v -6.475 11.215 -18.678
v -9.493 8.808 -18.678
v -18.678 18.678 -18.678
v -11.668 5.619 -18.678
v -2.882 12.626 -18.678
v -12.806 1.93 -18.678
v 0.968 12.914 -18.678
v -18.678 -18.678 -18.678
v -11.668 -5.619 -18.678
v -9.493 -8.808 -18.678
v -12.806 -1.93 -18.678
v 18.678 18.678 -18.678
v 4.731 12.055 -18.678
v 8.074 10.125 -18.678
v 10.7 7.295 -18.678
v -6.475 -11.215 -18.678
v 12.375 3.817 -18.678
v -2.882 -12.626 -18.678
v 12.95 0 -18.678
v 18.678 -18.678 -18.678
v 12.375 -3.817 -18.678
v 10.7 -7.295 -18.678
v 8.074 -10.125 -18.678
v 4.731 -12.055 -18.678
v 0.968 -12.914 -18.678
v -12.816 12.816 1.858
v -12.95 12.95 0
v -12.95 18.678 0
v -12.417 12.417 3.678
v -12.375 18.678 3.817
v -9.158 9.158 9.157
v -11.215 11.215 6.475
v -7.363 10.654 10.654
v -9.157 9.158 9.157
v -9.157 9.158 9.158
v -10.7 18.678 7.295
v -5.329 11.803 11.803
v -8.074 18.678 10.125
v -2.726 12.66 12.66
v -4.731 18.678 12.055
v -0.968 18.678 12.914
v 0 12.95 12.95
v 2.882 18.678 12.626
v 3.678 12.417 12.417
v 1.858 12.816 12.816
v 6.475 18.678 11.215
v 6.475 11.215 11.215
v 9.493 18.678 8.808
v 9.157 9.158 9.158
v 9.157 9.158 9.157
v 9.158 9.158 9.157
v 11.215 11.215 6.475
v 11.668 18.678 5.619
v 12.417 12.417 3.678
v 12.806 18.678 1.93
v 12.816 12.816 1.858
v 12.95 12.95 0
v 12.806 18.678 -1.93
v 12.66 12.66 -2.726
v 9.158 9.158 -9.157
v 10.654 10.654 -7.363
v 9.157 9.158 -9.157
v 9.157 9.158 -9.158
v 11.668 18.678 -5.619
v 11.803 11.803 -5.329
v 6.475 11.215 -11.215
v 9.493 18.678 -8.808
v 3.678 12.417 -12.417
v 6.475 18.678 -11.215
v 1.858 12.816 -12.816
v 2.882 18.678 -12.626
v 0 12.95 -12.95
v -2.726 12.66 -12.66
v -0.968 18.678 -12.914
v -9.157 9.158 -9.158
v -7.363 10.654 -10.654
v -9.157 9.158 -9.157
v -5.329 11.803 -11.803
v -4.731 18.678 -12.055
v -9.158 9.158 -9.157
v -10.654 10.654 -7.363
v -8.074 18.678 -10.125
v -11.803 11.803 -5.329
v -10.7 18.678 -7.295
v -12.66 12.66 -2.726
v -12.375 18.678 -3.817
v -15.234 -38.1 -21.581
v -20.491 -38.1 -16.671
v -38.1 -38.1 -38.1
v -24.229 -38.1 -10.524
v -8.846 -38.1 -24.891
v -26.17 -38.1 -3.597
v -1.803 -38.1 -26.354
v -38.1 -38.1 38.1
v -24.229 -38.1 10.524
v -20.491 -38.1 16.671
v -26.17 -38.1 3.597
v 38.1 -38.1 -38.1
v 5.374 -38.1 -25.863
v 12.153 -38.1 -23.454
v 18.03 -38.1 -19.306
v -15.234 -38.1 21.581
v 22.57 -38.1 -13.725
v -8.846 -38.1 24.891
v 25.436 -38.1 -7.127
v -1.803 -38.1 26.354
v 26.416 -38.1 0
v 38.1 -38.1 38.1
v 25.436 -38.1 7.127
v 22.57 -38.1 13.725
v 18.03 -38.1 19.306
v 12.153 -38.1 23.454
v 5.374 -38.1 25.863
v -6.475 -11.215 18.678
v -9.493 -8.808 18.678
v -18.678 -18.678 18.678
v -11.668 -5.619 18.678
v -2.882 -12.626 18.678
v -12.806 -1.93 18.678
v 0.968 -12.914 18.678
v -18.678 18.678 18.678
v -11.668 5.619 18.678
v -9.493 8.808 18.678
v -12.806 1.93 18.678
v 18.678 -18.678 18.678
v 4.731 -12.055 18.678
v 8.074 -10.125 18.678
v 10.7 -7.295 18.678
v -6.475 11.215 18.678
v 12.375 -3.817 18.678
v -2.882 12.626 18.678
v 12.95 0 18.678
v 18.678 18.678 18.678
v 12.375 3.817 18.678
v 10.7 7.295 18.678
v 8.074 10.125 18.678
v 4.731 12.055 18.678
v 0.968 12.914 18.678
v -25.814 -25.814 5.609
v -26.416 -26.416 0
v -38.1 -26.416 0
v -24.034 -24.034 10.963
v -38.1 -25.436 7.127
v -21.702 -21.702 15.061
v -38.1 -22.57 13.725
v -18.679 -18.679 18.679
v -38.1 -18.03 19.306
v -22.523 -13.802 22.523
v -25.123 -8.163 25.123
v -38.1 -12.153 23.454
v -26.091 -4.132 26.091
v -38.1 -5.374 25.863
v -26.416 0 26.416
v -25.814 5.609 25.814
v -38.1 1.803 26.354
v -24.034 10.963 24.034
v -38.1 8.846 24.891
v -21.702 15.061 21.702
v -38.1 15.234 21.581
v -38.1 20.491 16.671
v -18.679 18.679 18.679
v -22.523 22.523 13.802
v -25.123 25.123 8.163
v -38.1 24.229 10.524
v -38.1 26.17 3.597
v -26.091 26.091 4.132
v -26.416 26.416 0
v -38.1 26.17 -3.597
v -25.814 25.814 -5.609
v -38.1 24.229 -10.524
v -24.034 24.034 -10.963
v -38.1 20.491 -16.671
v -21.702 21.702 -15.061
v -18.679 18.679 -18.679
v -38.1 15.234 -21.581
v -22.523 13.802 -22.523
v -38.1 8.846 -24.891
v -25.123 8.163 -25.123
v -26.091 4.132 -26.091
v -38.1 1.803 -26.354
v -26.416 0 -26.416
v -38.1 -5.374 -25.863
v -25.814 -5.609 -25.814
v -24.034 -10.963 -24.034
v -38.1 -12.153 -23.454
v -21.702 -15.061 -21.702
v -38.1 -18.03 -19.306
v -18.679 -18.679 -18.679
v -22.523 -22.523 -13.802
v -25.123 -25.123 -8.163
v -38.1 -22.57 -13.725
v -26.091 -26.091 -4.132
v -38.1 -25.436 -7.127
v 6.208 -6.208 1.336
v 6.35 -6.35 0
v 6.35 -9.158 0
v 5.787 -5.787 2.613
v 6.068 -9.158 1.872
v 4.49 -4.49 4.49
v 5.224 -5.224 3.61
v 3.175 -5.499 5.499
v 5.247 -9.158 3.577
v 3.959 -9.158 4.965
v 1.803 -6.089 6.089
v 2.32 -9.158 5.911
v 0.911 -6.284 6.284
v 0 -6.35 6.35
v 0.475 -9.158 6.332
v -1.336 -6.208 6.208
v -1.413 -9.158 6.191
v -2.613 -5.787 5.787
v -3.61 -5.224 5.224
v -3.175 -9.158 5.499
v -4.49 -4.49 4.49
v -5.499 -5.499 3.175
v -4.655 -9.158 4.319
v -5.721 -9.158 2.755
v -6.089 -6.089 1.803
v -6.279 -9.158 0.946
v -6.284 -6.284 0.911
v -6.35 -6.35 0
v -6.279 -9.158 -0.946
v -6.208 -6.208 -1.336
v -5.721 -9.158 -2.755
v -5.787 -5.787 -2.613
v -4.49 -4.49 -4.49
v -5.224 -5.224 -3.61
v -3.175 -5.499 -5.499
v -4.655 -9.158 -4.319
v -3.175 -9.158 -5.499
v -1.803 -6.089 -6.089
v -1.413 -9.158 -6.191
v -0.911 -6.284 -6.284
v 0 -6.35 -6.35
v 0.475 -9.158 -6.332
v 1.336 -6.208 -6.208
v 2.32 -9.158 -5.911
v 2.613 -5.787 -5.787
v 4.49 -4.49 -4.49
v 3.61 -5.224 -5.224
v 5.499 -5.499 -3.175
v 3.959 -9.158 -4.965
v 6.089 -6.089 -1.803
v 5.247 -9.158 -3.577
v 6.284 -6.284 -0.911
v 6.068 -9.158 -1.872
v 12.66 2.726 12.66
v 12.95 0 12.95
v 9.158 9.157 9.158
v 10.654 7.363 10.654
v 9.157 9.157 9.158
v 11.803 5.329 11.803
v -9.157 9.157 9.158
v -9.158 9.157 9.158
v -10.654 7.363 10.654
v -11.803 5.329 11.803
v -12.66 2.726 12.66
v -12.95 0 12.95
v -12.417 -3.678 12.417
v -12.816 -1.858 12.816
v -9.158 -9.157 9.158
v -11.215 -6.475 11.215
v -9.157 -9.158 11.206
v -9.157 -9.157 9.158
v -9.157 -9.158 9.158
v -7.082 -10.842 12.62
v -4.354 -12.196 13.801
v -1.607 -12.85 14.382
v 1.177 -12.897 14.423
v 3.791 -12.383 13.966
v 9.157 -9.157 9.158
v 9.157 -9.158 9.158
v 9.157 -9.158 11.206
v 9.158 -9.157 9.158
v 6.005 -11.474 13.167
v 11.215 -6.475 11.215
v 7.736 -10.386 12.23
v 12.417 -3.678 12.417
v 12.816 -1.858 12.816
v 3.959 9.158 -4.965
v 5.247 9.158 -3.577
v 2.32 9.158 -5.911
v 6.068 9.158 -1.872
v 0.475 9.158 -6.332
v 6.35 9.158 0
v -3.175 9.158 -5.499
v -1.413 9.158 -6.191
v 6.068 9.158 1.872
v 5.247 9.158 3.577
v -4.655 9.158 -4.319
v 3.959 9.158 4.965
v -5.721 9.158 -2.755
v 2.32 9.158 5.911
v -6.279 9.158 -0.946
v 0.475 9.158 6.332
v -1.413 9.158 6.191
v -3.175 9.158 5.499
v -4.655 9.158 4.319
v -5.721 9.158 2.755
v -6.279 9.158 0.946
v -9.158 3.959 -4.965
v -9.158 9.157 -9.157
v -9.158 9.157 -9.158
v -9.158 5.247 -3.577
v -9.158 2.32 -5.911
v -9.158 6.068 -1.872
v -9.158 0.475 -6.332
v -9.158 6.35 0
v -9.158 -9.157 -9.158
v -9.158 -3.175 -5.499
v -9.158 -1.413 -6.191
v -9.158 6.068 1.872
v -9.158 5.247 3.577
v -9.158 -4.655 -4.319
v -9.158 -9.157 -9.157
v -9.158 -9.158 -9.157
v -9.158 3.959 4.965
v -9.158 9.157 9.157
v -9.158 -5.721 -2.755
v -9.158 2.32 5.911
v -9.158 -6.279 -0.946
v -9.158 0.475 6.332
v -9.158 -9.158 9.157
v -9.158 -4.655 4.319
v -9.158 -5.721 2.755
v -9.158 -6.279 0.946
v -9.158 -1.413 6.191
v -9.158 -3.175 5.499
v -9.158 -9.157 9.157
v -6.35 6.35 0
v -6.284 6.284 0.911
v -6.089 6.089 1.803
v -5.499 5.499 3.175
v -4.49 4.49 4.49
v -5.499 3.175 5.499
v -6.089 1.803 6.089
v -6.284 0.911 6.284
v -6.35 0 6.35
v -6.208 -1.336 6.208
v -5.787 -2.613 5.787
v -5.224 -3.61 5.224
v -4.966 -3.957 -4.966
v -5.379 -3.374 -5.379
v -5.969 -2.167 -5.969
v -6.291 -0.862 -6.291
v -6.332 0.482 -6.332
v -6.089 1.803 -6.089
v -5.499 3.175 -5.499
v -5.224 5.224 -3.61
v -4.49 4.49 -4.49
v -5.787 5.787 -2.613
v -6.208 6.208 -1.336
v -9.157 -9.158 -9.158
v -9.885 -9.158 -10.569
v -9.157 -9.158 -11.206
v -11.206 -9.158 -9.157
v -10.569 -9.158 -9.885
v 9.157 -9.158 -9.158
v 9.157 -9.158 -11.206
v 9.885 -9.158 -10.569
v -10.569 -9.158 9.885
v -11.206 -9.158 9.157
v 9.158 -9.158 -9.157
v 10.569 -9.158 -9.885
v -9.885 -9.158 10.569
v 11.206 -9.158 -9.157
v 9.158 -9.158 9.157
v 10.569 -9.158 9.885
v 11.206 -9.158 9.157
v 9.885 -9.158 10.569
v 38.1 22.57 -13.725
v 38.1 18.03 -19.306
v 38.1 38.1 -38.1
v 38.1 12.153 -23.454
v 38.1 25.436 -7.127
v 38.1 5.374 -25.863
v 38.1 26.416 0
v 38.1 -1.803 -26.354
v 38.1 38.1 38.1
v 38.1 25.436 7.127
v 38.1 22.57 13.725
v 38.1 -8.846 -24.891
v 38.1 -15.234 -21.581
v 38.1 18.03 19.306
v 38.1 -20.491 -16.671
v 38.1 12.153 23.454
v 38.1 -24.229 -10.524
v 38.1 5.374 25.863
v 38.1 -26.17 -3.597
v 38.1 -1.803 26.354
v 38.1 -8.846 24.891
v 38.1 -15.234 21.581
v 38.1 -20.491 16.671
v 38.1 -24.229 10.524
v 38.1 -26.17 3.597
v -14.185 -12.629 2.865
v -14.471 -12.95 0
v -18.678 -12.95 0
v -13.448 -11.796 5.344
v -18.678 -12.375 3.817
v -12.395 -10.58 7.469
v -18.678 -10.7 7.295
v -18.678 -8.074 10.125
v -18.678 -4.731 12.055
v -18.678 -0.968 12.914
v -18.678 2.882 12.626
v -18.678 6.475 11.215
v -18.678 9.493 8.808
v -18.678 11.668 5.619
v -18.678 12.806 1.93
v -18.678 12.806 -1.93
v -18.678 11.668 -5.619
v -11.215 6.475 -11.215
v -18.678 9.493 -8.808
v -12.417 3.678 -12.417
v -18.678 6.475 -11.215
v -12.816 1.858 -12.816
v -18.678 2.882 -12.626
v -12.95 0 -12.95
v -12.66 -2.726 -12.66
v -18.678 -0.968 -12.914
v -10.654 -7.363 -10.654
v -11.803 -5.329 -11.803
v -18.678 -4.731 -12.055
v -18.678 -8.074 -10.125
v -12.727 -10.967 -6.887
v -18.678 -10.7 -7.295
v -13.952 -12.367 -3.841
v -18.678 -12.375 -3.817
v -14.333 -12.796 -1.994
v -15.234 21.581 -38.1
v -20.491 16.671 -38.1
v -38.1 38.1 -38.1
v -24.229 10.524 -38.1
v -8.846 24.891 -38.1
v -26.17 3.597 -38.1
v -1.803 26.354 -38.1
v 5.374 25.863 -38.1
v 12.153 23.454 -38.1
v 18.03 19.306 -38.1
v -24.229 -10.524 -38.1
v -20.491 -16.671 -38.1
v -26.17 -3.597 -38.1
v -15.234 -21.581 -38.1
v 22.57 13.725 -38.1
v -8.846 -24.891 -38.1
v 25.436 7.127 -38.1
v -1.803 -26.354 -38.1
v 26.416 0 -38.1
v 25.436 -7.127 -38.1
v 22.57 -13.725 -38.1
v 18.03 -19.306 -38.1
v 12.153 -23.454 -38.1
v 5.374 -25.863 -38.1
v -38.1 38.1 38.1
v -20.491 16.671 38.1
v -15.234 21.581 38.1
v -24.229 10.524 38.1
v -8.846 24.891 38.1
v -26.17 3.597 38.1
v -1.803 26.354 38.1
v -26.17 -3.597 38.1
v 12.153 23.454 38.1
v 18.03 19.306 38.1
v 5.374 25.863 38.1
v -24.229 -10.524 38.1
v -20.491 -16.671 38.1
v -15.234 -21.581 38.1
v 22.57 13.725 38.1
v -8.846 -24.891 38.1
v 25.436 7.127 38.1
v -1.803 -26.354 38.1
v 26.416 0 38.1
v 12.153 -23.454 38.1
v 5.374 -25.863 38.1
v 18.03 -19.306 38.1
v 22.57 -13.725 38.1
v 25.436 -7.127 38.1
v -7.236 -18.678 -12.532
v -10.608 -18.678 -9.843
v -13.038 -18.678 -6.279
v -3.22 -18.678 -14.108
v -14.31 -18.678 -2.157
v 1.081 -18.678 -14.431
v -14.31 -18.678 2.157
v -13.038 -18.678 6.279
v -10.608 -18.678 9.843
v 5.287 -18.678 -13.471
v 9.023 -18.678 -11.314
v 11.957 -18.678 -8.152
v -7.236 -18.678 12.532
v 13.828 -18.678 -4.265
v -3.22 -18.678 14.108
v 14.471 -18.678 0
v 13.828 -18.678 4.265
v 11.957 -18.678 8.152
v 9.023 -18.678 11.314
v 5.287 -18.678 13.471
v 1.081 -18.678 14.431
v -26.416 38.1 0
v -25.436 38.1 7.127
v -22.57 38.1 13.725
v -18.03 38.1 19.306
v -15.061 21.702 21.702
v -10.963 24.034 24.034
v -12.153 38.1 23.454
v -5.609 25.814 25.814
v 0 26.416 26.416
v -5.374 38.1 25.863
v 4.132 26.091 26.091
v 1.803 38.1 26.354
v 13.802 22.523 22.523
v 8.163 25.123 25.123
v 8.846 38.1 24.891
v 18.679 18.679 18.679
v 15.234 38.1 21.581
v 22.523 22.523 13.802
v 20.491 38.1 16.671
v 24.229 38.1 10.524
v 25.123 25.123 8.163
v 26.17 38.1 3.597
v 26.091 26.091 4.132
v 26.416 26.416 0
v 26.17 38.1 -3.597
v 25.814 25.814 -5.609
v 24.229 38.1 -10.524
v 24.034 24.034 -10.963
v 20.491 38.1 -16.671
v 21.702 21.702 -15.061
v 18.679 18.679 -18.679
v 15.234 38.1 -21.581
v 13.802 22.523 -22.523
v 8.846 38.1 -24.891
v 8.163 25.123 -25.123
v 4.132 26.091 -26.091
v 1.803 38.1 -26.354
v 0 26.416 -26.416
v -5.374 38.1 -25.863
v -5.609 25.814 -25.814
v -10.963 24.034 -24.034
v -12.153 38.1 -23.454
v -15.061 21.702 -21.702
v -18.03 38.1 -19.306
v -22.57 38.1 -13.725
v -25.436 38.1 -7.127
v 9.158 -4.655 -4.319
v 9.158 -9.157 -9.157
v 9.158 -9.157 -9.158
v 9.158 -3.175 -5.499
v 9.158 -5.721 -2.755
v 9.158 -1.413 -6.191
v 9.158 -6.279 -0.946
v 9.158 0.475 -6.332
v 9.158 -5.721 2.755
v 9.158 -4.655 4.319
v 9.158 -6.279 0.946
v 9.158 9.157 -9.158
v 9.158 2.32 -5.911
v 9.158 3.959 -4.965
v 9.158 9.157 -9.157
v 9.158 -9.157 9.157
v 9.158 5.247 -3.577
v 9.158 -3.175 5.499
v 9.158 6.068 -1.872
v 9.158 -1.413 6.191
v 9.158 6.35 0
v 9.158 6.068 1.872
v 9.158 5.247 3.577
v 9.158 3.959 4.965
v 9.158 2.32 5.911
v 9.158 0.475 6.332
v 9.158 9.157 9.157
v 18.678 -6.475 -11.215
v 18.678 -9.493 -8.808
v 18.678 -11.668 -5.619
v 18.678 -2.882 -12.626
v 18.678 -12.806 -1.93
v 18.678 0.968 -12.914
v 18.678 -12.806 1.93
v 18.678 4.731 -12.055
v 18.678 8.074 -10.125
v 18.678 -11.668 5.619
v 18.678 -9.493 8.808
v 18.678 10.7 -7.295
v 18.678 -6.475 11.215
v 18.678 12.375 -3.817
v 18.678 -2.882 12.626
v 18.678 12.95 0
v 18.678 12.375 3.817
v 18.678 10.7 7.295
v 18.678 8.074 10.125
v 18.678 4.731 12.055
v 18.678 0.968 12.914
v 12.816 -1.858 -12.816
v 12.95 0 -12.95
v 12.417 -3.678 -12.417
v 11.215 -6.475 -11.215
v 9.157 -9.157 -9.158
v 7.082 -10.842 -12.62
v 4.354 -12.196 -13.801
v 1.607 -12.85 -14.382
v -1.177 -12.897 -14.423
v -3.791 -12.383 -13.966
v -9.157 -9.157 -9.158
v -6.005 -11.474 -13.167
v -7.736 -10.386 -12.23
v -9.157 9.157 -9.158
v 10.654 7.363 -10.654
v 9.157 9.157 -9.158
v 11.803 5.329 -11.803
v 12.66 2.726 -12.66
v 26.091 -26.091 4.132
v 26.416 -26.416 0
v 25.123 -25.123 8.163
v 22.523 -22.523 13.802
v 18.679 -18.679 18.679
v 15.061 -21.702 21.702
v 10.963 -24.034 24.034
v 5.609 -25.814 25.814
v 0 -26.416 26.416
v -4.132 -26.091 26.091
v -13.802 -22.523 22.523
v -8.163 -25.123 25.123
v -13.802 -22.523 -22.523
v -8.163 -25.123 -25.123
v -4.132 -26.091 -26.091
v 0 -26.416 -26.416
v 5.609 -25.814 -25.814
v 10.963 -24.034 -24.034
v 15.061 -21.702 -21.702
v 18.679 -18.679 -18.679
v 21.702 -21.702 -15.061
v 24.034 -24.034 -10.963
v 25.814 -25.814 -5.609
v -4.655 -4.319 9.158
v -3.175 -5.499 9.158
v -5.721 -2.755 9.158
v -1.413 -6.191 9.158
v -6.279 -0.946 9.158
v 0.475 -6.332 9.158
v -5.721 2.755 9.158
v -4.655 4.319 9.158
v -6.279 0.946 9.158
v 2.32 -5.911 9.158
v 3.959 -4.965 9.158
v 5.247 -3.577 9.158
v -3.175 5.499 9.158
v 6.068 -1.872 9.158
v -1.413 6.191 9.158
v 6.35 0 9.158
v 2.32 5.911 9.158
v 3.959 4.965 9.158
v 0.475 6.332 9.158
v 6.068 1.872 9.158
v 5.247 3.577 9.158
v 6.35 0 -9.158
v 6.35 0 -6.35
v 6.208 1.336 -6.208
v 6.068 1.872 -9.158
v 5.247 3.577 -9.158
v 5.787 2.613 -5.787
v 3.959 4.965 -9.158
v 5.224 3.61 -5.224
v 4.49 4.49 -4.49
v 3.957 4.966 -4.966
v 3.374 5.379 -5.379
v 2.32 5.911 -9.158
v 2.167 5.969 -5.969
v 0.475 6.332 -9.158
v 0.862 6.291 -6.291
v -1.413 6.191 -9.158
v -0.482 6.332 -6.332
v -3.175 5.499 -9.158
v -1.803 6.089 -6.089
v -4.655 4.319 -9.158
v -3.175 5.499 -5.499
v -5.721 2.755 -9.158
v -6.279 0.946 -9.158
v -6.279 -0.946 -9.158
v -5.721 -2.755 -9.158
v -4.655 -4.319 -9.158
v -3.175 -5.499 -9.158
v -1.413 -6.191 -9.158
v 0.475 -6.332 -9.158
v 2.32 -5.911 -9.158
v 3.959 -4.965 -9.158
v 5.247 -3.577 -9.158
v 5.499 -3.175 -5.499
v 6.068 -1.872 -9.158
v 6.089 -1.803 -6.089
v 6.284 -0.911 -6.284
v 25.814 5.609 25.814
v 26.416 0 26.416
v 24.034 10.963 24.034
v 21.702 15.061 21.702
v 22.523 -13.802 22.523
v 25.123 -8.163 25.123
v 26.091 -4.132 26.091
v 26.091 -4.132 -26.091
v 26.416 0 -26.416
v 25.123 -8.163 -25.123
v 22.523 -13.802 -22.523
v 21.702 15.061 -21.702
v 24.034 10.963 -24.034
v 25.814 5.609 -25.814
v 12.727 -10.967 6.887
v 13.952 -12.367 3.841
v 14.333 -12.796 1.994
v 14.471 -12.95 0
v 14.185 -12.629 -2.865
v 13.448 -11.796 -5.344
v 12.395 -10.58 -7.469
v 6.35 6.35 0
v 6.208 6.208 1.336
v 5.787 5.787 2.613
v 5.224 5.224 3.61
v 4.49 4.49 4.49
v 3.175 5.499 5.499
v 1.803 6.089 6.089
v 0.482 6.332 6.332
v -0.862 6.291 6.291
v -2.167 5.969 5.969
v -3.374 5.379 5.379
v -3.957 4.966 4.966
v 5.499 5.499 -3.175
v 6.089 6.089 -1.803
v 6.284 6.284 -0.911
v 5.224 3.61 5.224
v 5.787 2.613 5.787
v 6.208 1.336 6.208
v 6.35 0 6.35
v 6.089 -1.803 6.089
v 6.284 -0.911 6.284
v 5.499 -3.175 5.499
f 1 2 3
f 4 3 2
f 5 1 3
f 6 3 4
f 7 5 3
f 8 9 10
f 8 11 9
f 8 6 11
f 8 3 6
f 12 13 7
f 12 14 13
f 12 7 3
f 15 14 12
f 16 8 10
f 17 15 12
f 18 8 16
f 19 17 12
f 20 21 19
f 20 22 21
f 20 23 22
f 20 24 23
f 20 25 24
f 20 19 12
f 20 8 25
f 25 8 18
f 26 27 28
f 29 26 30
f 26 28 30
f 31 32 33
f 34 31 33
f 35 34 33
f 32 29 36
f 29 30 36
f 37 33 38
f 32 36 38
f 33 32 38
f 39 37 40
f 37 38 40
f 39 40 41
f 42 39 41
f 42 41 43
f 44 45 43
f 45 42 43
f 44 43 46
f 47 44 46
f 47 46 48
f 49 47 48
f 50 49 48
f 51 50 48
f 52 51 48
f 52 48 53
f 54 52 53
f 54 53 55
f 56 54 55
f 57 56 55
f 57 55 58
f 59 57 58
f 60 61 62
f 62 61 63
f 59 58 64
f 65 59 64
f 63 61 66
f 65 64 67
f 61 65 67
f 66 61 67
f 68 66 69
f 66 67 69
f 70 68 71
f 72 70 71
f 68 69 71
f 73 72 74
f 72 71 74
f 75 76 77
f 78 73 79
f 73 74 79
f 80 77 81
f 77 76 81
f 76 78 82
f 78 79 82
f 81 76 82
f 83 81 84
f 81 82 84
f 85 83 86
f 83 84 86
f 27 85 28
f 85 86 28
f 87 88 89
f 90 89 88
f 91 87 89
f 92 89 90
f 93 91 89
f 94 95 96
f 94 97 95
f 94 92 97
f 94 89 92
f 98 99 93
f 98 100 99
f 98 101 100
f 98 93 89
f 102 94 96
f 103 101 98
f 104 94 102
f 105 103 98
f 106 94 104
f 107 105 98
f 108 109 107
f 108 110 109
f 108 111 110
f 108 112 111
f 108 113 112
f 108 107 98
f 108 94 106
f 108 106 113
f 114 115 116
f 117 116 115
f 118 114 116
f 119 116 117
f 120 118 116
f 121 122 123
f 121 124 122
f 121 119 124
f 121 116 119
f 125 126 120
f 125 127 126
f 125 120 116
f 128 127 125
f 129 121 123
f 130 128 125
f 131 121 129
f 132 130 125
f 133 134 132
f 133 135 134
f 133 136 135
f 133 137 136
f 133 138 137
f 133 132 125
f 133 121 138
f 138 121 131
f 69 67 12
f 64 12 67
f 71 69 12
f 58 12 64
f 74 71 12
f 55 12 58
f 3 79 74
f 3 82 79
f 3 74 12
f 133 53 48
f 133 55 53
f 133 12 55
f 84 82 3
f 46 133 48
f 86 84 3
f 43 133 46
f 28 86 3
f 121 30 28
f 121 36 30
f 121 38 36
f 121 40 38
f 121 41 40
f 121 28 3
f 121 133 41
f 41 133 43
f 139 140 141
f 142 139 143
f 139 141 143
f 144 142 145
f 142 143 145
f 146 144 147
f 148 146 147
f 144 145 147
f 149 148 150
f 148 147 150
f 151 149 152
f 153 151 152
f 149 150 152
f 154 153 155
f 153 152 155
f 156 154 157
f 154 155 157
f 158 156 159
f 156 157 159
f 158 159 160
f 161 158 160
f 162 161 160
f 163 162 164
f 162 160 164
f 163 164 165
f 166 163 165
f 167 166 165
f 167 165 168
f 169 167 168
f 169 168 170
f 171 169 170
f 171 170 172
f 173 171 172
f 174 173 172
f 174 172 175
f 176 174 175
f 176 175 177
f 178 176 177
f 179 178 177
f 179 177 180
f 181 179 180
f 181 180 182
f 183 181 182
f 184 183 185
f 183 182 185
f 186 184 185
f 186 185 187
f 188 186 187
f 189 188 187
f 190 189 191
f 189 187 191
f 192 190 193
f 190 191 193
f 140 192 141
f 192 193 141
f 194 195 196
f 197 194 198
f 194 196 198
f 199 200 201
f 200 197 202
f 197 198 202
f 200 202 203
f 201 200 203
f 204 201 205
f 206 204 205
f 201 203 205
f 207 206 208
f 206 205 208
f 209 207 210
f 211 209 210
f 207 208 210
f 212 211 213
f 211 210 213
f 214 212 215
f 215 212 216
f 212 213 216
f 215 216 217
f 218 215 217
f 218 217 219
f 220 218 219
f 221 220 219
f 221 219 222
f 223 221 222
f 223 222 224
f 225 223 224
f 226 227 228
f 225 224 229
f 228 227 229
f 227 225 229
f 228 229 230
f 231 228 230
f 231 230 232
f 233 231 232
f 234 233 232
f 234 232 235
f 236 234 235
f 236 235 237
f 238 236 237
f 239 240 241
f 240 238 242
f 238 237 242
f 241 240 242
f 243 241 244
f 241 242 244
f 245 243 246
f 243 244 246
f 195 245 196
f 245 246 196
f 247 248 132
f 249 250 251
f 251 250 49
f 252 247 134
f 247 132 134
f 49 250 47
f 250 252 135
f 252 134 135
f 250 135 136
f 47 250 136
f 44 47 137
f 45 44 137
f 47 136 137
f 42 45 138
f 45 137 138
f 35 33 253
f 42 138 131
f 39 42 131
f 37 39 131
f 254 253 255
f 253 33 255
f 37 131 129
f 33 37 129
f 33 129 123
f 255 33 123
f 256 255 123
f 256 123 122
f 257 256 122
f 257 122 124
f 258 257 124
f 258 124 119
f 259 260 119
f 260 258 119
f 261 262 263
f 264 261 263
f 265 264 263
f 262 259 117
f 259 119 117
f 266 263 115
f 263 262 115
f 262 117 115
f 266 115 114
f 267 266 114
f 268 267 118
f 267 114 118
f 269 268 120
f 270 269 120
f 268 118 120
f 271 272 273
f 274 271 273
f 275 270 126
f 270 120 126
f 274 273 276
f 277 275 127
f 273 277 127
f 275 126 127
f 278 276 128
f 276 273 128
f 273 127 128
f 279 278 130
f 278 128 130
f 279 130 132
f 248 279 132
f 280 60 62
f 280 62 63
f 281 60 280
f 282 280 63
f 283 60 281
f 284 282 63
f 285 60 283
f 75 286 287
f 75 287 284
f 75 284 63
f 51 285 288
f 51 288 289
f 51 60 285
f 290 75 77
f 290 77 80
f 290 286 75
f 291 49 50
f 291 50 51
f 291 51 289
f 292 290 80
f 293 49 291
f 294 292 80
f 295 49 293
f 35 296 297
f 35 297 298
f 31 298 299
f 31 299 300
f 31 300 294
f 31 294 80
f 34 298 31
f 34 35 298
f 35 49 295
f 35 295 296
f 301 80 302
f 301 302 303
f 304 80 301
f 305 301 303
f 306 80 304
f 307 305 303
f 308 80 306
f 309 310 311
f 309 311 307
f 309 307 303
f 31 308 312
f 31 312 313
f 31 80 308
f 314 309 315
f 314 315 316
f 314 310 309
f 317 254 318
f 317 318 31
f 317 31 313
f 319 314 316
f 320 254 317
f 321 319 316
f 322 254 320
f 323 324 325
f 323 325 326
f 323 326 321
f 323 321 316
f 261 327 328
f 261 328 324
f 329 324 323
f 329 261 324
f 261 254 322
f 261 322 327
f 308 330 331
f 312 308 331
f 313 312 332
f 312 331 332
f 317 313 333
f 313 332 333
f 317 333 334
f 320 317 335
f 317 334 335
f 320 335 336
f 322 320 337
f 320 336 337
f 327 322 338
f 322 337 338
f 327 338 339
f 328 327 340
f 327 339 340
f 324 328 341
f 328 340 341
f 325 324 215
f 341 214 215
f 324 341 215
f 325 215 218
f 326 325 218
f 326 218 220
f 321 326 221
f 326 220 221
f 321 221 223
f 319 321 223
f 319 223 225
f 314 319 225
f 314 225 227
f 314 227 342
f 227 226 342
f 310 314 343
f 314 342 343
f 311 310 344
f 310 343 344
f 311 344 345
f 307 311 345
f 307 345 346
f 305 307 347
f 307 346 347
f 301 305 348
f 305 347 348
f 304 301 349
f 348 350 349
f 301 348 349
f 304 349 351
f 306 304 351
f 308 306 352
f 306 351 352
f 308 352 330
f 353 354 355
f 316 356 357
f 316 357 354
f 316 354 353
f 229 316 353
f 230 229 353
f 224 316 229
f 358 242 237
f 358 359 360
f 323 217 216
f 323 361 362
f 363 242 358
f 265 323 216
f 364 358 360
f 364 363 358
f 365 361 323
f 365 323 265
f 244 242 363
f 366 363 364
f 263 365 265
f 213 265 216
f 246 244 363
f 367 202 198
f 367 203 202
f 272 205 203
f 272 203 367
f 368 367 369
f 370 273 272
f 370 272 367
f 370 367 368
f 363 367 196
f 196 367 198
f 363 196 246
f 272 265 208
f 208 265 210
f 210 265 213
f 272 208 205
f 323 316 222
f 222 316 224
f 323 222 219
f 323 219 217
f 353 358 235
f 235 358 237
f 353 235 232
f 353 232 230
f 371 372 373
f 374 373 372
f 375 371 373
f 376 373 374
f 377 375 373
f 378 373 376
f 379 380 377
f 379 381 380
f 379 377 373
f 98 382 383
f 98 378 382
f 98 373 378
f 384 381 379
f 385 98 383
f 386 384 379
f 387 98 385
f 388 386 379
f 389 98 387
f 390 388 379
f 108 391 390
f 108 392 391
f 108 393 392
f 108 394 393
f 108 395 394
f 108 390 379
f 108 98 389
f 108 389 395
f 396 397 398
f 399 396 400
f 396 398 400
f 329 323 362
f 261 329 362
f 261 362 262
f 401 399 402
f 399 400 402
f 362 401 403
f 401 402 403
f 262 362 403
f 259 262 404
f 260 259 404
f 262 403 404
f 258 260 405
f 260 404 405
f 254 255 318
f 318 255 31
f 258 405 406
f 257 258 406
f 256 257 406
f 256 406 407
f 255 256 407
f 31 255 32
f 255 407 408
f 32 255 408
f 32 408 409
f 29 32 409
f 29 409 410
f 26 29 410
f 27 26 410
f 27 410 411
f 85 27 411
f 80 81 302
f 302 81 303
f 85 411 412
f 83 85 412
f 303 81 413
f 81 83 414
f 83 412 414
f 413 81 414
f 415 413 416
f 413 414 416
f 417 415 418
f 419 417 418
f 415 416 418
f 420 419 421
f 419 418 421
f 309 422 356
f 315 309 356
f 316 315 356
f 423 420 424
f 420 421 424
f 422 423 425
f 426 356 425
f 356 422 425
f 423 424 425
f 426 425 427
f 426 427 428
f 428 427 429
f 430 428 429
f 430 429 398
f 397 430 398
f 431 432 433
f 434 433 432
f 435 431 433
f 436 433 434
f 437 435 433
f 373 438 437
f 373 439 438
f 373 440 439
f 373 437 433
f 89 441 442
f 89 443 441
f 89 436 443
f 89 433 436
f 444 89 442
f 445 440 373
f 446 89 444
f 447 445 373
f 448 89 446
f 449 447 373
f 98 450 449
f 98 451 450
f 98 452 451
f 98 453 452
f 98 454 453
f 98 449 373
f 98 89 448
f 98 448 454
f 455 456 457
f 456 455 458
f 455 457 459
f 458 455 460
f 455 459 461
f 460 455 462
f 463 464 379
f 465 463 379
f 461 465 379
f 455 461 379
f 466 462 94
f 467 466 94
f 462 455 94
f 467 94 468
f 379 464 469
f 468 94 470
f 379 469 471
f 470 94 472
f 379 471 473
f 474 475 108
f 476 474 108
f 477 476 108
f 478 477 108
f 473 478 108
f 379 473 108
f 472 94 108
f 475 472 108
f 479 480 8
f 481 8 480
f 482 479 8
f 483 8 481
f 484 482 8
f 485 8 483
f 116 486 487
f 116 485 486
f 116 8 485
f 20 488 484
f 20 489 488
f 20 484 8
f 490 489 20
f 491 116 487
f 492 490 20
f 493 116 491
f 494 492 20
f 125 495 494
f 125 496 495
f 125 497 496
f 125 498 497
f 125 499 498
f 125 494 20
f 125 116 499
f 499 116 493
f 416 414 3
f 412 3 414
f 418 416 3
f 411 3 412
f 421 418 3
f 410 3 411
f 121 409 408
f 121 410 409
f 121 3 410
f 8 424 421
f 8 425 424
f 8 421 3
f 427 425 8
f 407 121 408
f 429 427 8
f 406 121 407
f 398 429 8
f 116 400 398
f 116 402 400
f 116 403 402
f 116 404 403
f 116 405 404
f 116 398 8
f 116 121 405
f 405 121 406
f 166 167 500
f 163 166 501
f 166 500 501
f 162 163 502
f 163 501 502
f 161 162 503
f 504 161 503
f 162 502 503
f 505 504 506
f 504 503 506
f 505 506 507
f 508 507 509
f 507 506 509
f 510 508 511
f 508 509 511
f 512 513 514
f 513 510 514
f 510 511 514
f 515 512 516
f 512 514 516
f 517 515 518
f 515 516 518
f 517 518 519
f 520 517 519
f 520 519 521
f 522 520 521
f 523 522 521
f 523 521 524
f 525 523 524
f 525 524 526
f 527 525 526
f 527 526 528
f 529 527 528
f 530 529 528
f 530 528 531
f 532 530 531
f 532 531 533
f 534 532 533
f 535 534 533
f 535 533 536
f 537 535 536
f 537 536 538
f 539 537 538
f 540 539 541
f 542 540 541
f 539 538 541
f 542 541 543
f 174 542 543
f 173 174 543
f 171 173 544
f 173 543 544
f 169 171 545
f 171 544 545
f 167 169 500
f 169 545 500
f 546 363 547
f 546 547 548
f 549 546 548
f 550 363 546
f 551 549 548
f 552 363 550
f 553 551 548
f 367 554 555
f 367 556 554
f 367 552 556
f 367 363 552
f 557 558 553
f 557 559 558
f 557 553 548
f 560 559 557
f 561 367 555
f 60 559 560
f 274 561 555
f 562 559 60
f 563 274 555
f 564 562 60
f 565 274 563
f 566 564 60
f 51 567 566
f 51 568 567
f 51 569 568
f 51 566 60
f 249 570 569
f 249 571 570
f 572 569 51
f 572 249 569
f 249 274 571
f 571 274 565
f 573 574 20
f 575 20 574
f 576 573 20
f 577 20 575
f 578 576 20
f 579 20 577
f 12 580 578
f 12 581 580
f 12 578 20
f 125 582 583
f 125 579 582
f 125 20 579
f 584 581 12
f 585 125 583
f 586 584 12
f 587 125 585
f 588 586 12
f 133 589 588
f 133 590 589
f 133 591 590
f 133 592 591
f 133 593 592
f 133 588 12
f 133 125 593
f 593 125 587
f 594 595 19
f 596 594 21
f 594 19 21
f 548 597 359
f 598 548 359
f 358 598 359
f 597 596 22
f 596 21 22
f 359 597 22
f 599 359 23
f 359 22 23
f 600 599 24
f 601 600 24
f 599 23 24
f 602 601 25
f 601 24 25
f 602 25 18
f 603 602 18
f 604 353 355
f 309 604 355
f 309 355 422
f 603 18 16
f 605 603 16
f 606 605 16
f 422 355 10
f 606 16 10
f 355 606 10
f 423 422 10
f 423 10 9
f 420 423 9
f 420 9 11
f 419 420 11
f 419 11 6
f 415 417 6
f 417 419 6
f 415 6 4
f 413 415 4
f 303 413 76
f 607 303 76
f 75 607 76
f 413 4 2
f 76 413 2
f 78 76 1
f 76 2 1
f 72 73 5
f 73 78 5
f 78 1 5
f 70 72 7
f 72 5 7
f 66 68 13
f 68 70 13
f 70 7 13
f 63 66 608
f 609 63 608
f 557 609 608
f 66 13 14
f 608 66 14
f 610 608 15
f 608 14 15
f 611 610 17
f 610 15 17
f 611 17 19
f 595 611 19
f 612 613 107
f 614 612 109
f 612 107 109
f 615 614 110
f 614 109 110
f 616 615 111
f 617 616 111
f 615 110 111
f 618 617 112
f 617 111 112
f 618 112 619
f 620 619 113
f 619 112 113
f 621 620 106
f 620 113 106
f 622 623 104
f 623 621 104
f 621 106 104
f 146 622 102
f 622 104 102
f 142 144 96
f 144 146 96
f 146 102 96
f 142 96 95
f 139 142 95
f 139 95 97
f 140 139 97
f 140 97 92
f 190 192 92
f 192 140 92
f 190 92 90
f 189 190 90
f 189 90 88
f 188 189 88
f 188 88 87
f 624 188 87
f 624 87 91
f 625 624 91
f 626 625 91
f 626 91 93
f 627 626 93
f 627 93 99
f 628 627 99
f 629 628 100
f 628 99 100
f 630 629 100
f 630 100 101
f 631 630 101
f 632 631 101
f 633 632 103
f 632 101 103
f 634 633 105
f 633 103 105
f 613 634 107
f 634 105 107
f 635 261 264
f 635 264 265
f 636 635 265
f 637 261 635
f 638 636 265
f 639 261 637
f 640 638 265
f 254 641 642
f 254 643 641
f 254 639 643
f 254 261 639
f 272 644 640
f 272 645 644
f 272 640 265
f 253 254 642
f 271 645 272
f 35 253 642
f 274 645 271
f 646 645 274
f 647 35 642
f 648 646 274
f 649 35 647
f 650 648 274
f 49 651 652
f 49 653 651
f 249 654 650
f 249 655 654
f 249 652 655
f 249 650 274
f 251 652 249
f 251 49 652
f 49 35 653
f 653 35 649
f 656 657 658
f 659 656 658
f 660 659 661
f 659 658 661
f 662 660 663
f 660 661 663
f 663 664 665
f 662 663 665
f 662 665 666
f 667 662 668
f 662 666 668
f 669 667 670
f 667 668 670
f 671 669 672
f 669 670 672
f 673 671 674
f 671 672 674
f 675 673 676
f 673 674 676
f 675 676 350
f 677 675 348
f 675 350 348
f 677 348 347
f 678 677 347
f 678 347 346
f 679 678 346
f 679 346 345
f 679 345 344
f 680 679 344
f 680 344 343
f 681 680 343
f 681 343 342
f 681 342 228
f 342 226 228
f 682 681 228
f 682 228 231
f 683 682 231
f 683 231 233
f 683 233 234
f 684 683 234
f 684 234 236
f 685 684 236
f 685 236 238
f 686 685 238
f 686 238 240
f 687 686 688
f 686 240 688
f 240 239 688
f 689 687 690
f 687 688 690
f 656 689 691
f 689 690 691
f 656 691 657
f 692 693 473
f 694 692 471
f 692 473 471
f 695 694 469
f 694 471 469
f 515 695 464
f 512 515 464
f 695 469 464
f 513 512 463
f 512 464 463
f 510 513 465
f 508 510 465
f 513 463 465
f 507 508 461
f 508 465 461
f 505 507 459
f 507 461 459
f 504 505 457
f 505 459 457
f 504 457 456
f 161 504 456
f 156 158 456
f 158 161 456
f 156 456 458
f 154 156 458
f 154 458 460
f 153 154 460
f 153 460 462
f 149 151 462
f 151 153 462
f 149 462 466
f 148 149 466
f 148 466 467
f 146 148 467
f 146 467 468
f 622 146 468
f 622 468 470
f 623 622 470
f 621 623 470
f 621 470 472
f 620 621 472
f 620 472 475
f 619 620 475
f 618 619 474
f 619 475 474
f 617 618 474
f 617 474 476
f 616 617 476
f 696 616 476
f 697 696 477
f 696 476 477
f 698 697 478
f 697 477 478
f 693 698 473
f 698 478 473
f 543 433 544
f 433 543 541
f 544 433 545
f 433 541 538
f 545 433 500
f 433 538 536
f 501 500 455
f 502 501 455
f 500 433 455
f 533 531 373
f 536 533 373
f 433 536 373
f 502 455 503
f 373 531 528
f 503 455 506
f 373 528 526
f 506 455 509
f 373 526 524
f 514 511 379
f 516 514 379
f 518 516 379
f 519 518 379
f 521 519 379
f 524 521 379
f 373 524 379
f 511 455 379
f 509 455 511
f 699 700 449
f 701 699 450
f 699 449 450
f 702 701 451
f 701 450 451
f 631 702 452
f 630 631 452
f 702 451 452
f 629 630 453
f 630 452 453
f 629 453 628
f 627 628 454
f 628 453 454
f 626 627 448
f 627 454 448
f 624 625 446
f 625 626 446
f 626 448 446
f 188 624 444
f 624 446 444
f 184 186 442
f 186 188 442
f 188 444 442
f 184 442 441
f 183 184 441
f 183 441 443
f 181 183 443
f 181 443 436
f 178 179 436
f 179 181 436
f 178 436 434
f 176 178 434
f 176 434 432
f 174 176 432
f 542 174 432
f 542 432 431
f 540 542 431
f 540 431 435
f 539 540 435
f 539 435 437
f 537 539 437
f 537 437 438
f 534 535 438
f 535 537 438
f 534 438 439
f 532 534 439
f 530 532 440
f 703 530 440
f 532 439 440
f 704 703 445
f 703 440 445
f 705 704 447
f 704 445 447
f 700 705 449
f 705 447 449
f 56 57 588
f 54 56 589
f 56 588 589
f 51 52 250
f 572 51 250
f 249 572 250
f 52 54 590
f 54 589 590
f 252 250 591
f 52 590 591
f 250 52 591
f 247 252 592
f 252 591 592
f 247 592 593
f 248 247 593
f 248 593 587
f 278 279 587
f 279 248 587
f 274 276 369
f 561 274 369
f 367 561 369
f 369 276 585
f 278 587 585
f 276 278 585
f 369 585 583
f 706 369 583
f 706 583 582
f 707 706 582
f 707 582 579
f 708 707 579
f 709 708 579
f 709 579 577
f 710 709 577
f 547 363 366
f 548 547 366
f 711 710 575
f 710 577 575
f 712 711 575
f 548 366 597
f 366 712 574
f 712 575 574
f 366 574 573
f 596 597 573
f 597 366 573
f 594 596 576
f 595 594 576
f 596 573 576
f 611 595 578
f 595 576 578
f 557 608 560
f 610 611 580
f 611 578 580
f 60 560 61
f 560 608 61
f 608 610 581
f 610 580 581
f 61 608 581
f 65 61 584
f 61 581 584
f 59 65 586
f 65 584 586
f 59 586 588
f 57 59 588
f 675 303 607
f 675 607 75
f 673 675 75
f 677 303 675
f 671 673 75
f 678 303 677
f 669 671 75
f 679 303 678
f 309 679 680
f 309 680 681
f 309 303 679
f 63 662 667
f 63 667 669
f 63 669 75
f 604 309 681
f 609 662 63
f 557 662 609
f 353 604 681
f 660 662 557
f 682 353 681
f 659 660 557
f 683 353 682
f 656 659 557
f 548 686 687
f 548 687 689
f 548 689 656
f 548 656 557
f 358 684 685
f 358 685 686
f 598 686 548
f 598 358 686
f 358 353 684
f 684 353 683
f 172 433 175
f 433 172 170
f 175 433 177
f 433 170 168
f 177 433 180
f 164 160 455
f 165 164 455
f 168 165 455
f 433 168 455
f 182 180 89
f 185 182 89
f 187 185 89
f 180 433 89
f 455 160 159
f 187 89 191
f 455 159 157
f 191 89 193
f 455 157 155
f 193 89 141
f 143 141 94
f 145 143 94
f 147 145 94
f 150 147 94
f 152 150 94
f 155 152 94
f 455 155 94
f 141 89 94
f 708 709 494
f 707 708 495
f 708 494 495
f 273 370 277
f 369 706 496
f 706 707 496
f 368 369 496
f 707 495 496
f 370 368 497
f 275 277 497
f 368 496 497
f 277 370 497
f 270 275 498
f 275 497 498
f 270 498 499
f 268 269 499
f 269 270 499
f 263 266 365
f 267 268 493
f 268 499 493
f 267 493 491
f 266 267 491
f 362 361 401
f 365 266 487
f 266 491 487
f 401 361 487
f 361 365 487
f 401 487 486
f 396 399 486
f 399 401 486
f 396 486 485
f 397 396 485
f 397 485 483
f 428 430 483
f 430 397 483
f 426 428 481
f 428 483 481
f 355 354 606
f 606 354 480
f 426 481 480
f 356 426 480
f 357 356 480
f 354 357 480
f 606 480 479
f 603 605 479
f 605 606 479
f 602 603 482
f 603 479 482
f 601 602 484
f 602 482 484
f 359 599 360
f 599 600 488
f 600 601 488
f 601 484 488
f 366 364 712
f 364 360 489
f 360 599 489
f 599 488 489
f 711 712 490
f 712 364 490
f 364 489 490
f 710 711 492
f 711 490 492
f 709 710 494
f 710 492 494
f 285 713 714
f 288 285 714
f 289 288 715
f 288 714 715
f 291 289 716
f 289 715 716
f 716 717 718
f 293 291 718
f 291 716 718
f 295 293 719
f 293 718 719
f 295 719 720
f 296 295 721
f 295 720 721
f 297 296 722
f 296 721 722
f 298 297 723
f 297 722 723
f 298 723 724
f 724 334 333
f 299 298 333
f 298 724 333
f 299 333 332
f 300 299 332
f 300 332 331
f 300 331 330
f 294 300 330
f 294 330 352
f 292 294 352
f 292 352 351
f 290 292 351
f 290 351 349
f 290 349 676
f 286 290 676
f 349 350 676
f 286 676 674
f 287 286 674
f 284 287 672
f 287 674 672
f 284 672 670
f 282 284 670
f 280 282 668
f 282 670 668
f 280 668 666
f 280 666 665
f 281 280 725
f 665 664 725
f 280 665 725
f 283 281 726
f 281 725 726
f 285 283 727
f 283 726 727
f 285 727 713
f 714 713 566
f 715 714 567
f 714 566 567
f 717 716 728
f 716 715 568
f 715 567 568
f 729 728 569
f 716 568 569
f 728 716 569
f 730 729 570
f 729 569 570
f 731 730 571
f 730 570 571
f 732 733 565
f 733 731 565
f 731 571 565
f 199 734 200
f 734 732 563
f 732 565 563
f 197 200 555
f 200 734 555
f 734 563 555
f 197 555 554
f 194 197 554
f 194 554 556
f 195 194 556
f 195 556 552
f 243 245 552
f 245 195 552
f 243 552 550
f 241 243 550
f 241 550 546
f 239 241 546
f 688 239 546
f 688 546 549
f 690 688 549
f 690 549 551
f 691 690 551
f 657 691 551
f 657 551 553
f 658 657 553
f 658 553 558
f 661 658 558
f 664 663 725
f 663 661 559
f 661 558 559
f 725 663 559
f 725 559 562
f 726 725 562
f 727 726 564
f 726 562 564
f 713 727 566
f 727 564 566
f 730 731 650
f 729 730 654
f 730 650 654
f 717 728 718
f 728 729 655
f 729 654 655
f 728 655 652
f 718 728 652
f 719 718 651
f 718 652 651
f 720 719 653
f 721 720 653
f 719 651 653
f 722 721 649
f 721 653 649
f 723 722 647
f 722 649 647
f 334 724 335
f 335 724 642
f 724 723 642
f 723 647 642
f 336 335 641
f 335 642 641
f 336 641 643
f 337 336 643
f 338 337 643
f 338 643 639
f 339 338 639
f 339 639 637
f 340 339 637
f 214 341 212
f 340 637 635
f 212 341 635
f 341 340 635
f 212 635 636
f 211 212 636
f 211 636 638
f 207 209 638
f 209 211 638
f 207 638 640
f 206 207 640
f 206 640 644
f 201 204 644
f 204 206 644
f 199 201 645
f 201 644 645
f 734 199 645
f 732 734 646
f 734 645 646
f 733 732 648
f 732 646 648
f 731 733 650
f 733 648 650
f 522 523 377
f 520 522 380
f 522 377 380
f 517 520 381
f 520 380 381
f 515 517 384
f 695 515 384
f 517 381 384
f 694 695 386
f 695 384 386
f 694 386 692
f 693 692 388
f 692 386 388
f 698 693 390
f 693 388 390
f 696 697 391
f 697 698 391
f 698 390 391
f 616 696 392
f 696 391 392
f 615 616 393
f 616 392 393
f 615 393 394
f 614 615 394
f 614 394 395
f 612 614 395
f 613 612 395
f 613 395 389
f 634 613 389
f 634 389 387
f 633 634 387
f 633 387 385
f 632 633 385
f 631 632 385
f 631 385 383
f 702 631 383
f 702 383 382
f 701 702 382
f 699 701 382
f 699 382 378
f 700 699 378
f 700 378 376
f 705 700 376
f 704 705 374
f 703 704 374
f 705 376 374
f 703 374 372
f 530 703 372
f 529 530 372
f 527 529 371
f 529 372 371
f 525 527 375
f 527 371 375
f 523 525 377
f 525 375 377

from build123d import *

# Parameters (mm, degrees)
F0_W          = 76.2
F0_H          = 76.2
F1_DEPTH      = 38.1
F1_DEPTH_BACK = 38.1
F2_R          = 6.35
F3_DEPTH      = 76.201
F4_R          = 6.35
F5_DEPTH      = 76.201
F6_R          = 6.35
F7_DEPTH      = 76.201
F9_R          = 12.95019
F8_R          = 26.416
F8_R_2        = 6.35
F10_DEPTH     = 19.42211
F11_DEPTH     = 28.9424491
F12_R         = 26.416
F12_R_2       = 6.35
F14_DEPTH     = 19.42211
F13_R         = 12.95019
F15_DEPTH     = 28.9424491
F16_R         = 26.416
F16_R_2       = 6.35
F18_DEPTH     = 19.42211
F17_R         = 12.95019
F19_DEPTH     = 28.9424491
F20_R         = 26.416
F20_R_2       = 6.35
F22_DEPTH     = 19.42211
F21_R         = 12.95019
F23_DEPTH     = 28.9424491
F24_R         = 26.416
F24_R_2       = 6.35
F26_DEPTH     = 19.42211
F25_R         = 14.47122455
F27_DEPTH     = 28.9424491
F28_R         = 26.416
F28_R_2       = 6.35
F30_DEPTH     = 19.42211
F29_R         = 12.95019
F31_DEPTH     = 28.9424491


with BuildPart() as f1:
    # F0 (on Front) → F1 (new body, two sides)
    with BuildSketch(Plane.XZ) as f1_sk:
        Rectangle(F0_W, F0_H)
    extrude(amount=F1_DEPTH)
    extrude(f1_sk.sketch, amount=-F1_DEPTH_BACK)

    # F2 (on face) → F3 (cut, through all)
    with BuildSketch(Plane.XZ.offset(38.1)):
        Circle(F2_R)
    extrude(amount=-F3_DEPTH, mode=Mode.SUBTRACT)

    # F4 (on face) → F5 (cut, through all)
    with BuildSketch(Plane.XY.offset(38.1)):
        Circle(F4_R)
    extrude(amount=-F5_DEPTH, mode=Mode.SUBTRACT)

    # F6 (on face) → F7 (cut, through all)
    with BuildSketch(Plane.YZ.offset(38.1)):
        Circle(F6_R)
    extrude(amount=-F7_DEPTH, mode=Mode.SUBTRACT)

    # F9 (on face) + F8 (on face) → F10 (cut)
    with BuildSketch(Plane(origin=(-38.1, 0, 0), x_dir=(0, -1, 0), z_dir=(-1, 0, 0))):
        Circle(F9_R)
    with BuildSketch(Plane(origin=(-38.1, 0, 0), x_dir=(0, -1, 0), z_dir=(-1, 0, 0))):
        Circle(F8_R)
        Circle(F8_R_2, mode=Mode.SUBTRACT)
    extrude(amount=-F10_DEPTH, mode=Mode.SUBTRACT)

    # F9 (on face) → F11 (cut)
    with BuildSketch(Plane(origin=(-38.1, 0, 0), x_dir=(0, -1, 0), z_dir=(-1, 0, 0))):
        Circle(F9_R)
    extrude(amount=-F11_DEPTH, mode=Mode.SUBTRACT)

    # F12 (on face) → F14 (cut)
    with BuildSketch(Plane.XY.offset(38.1)):
        Circle(F12_R)
        Circle(F12_R_2, mode=Mode.SUBTRACT)
    extrude(amount=-F14_DEPTH, mode=Mode.SUBTRACT)

    # F13 (on face) → F15 (cut)
    with BuildSketch(Plane.XY.offset(38.1)):
        Circle(F13_R)
    extrude(amount=-F15_DEPTH, mode=Mode.SUBTRACT)

    # F16 (on face) → F18 (cut)
    with BuildSketch(Plane(origin=(0, 38.1, 0), x_dir=(-1, 0, 0), z_dir=(0, 1, 0))):
        Circle(F16_R)
        Circle(F16_R_2, mode=Mode.SUBTRACT)
    extrude(amount=-F18_DEPTH, mode=Mode.SUBTRACT)

    # F17 (on face) → F19 (cut)
    with BuildSketch(Plane(origin=(0, 38.1, 0), x_dir=(-1, 0, 0), z_dir=(0, 1, 0))):
        Circle(F17_R)
    extrude(amount=-F19_DEPTH, mode=Mode.SUBTRACT)

    # F20 (on face) → F22 (cut)
    with BuildSketch(Plane.YZ.offset(38.1)):
        Circle(F20_R)
        Circle(F20_R_2, mode=Mode.SUBTRACT)
    extrude(amount=-F22_DEPTH, mode=Mode.SUBTRACT)

    # F21 (on face) → F23 (cut)
    with BuildSketch(Plane.YZ.offset(38.1)):
        Circle(F21_R)
    extrude(amount=-F23_DEPTH, mode=Mode.SUBTRACT)

    # F24 (on face) → F26 (cut)
    with BuildSketch(Plane.XZ.offset(38.1)):
        Circle(F24_R)
        Circle(F24_R_2, mode=Mode.SUBTRACT)
    extrude(amount=-F26_DEPTH, mode=Mode.SUBTRACT)

    # F25 (on face) → F27 (cut)
    with BuildSketch(Plane.XZ.offset(38.1)):
        Circle(F25_R)
    extrude(amount=-F27_DEPTH, mode=Mode.SUBTRACT)

    # F28 (on face) → F30 (cut)
    with BuildSketch(Plane(origin=(0, 0, -38.1), x_dir=(1, 0, 0), z_dir=(0, 0, -1))):
        Circle(F28_R)
        Circle(F28_R_2, mode=Mode.SUBTRACT)
    extrude(amount=-F30_DEPTH, mode=Mode.SUBTRACT)

    # F29 (on face) → F31 (cut)
    with BuildSketch(Plane(origin=(0, 0, -38.1), x_dir=(1, 0, 0), z_dir=(0, 0, -1))):
        Circle(F29_R)
    extrude(amount=-F31_DEPTH, mode=Mode.SUBTRACT)


solid = f1.part
